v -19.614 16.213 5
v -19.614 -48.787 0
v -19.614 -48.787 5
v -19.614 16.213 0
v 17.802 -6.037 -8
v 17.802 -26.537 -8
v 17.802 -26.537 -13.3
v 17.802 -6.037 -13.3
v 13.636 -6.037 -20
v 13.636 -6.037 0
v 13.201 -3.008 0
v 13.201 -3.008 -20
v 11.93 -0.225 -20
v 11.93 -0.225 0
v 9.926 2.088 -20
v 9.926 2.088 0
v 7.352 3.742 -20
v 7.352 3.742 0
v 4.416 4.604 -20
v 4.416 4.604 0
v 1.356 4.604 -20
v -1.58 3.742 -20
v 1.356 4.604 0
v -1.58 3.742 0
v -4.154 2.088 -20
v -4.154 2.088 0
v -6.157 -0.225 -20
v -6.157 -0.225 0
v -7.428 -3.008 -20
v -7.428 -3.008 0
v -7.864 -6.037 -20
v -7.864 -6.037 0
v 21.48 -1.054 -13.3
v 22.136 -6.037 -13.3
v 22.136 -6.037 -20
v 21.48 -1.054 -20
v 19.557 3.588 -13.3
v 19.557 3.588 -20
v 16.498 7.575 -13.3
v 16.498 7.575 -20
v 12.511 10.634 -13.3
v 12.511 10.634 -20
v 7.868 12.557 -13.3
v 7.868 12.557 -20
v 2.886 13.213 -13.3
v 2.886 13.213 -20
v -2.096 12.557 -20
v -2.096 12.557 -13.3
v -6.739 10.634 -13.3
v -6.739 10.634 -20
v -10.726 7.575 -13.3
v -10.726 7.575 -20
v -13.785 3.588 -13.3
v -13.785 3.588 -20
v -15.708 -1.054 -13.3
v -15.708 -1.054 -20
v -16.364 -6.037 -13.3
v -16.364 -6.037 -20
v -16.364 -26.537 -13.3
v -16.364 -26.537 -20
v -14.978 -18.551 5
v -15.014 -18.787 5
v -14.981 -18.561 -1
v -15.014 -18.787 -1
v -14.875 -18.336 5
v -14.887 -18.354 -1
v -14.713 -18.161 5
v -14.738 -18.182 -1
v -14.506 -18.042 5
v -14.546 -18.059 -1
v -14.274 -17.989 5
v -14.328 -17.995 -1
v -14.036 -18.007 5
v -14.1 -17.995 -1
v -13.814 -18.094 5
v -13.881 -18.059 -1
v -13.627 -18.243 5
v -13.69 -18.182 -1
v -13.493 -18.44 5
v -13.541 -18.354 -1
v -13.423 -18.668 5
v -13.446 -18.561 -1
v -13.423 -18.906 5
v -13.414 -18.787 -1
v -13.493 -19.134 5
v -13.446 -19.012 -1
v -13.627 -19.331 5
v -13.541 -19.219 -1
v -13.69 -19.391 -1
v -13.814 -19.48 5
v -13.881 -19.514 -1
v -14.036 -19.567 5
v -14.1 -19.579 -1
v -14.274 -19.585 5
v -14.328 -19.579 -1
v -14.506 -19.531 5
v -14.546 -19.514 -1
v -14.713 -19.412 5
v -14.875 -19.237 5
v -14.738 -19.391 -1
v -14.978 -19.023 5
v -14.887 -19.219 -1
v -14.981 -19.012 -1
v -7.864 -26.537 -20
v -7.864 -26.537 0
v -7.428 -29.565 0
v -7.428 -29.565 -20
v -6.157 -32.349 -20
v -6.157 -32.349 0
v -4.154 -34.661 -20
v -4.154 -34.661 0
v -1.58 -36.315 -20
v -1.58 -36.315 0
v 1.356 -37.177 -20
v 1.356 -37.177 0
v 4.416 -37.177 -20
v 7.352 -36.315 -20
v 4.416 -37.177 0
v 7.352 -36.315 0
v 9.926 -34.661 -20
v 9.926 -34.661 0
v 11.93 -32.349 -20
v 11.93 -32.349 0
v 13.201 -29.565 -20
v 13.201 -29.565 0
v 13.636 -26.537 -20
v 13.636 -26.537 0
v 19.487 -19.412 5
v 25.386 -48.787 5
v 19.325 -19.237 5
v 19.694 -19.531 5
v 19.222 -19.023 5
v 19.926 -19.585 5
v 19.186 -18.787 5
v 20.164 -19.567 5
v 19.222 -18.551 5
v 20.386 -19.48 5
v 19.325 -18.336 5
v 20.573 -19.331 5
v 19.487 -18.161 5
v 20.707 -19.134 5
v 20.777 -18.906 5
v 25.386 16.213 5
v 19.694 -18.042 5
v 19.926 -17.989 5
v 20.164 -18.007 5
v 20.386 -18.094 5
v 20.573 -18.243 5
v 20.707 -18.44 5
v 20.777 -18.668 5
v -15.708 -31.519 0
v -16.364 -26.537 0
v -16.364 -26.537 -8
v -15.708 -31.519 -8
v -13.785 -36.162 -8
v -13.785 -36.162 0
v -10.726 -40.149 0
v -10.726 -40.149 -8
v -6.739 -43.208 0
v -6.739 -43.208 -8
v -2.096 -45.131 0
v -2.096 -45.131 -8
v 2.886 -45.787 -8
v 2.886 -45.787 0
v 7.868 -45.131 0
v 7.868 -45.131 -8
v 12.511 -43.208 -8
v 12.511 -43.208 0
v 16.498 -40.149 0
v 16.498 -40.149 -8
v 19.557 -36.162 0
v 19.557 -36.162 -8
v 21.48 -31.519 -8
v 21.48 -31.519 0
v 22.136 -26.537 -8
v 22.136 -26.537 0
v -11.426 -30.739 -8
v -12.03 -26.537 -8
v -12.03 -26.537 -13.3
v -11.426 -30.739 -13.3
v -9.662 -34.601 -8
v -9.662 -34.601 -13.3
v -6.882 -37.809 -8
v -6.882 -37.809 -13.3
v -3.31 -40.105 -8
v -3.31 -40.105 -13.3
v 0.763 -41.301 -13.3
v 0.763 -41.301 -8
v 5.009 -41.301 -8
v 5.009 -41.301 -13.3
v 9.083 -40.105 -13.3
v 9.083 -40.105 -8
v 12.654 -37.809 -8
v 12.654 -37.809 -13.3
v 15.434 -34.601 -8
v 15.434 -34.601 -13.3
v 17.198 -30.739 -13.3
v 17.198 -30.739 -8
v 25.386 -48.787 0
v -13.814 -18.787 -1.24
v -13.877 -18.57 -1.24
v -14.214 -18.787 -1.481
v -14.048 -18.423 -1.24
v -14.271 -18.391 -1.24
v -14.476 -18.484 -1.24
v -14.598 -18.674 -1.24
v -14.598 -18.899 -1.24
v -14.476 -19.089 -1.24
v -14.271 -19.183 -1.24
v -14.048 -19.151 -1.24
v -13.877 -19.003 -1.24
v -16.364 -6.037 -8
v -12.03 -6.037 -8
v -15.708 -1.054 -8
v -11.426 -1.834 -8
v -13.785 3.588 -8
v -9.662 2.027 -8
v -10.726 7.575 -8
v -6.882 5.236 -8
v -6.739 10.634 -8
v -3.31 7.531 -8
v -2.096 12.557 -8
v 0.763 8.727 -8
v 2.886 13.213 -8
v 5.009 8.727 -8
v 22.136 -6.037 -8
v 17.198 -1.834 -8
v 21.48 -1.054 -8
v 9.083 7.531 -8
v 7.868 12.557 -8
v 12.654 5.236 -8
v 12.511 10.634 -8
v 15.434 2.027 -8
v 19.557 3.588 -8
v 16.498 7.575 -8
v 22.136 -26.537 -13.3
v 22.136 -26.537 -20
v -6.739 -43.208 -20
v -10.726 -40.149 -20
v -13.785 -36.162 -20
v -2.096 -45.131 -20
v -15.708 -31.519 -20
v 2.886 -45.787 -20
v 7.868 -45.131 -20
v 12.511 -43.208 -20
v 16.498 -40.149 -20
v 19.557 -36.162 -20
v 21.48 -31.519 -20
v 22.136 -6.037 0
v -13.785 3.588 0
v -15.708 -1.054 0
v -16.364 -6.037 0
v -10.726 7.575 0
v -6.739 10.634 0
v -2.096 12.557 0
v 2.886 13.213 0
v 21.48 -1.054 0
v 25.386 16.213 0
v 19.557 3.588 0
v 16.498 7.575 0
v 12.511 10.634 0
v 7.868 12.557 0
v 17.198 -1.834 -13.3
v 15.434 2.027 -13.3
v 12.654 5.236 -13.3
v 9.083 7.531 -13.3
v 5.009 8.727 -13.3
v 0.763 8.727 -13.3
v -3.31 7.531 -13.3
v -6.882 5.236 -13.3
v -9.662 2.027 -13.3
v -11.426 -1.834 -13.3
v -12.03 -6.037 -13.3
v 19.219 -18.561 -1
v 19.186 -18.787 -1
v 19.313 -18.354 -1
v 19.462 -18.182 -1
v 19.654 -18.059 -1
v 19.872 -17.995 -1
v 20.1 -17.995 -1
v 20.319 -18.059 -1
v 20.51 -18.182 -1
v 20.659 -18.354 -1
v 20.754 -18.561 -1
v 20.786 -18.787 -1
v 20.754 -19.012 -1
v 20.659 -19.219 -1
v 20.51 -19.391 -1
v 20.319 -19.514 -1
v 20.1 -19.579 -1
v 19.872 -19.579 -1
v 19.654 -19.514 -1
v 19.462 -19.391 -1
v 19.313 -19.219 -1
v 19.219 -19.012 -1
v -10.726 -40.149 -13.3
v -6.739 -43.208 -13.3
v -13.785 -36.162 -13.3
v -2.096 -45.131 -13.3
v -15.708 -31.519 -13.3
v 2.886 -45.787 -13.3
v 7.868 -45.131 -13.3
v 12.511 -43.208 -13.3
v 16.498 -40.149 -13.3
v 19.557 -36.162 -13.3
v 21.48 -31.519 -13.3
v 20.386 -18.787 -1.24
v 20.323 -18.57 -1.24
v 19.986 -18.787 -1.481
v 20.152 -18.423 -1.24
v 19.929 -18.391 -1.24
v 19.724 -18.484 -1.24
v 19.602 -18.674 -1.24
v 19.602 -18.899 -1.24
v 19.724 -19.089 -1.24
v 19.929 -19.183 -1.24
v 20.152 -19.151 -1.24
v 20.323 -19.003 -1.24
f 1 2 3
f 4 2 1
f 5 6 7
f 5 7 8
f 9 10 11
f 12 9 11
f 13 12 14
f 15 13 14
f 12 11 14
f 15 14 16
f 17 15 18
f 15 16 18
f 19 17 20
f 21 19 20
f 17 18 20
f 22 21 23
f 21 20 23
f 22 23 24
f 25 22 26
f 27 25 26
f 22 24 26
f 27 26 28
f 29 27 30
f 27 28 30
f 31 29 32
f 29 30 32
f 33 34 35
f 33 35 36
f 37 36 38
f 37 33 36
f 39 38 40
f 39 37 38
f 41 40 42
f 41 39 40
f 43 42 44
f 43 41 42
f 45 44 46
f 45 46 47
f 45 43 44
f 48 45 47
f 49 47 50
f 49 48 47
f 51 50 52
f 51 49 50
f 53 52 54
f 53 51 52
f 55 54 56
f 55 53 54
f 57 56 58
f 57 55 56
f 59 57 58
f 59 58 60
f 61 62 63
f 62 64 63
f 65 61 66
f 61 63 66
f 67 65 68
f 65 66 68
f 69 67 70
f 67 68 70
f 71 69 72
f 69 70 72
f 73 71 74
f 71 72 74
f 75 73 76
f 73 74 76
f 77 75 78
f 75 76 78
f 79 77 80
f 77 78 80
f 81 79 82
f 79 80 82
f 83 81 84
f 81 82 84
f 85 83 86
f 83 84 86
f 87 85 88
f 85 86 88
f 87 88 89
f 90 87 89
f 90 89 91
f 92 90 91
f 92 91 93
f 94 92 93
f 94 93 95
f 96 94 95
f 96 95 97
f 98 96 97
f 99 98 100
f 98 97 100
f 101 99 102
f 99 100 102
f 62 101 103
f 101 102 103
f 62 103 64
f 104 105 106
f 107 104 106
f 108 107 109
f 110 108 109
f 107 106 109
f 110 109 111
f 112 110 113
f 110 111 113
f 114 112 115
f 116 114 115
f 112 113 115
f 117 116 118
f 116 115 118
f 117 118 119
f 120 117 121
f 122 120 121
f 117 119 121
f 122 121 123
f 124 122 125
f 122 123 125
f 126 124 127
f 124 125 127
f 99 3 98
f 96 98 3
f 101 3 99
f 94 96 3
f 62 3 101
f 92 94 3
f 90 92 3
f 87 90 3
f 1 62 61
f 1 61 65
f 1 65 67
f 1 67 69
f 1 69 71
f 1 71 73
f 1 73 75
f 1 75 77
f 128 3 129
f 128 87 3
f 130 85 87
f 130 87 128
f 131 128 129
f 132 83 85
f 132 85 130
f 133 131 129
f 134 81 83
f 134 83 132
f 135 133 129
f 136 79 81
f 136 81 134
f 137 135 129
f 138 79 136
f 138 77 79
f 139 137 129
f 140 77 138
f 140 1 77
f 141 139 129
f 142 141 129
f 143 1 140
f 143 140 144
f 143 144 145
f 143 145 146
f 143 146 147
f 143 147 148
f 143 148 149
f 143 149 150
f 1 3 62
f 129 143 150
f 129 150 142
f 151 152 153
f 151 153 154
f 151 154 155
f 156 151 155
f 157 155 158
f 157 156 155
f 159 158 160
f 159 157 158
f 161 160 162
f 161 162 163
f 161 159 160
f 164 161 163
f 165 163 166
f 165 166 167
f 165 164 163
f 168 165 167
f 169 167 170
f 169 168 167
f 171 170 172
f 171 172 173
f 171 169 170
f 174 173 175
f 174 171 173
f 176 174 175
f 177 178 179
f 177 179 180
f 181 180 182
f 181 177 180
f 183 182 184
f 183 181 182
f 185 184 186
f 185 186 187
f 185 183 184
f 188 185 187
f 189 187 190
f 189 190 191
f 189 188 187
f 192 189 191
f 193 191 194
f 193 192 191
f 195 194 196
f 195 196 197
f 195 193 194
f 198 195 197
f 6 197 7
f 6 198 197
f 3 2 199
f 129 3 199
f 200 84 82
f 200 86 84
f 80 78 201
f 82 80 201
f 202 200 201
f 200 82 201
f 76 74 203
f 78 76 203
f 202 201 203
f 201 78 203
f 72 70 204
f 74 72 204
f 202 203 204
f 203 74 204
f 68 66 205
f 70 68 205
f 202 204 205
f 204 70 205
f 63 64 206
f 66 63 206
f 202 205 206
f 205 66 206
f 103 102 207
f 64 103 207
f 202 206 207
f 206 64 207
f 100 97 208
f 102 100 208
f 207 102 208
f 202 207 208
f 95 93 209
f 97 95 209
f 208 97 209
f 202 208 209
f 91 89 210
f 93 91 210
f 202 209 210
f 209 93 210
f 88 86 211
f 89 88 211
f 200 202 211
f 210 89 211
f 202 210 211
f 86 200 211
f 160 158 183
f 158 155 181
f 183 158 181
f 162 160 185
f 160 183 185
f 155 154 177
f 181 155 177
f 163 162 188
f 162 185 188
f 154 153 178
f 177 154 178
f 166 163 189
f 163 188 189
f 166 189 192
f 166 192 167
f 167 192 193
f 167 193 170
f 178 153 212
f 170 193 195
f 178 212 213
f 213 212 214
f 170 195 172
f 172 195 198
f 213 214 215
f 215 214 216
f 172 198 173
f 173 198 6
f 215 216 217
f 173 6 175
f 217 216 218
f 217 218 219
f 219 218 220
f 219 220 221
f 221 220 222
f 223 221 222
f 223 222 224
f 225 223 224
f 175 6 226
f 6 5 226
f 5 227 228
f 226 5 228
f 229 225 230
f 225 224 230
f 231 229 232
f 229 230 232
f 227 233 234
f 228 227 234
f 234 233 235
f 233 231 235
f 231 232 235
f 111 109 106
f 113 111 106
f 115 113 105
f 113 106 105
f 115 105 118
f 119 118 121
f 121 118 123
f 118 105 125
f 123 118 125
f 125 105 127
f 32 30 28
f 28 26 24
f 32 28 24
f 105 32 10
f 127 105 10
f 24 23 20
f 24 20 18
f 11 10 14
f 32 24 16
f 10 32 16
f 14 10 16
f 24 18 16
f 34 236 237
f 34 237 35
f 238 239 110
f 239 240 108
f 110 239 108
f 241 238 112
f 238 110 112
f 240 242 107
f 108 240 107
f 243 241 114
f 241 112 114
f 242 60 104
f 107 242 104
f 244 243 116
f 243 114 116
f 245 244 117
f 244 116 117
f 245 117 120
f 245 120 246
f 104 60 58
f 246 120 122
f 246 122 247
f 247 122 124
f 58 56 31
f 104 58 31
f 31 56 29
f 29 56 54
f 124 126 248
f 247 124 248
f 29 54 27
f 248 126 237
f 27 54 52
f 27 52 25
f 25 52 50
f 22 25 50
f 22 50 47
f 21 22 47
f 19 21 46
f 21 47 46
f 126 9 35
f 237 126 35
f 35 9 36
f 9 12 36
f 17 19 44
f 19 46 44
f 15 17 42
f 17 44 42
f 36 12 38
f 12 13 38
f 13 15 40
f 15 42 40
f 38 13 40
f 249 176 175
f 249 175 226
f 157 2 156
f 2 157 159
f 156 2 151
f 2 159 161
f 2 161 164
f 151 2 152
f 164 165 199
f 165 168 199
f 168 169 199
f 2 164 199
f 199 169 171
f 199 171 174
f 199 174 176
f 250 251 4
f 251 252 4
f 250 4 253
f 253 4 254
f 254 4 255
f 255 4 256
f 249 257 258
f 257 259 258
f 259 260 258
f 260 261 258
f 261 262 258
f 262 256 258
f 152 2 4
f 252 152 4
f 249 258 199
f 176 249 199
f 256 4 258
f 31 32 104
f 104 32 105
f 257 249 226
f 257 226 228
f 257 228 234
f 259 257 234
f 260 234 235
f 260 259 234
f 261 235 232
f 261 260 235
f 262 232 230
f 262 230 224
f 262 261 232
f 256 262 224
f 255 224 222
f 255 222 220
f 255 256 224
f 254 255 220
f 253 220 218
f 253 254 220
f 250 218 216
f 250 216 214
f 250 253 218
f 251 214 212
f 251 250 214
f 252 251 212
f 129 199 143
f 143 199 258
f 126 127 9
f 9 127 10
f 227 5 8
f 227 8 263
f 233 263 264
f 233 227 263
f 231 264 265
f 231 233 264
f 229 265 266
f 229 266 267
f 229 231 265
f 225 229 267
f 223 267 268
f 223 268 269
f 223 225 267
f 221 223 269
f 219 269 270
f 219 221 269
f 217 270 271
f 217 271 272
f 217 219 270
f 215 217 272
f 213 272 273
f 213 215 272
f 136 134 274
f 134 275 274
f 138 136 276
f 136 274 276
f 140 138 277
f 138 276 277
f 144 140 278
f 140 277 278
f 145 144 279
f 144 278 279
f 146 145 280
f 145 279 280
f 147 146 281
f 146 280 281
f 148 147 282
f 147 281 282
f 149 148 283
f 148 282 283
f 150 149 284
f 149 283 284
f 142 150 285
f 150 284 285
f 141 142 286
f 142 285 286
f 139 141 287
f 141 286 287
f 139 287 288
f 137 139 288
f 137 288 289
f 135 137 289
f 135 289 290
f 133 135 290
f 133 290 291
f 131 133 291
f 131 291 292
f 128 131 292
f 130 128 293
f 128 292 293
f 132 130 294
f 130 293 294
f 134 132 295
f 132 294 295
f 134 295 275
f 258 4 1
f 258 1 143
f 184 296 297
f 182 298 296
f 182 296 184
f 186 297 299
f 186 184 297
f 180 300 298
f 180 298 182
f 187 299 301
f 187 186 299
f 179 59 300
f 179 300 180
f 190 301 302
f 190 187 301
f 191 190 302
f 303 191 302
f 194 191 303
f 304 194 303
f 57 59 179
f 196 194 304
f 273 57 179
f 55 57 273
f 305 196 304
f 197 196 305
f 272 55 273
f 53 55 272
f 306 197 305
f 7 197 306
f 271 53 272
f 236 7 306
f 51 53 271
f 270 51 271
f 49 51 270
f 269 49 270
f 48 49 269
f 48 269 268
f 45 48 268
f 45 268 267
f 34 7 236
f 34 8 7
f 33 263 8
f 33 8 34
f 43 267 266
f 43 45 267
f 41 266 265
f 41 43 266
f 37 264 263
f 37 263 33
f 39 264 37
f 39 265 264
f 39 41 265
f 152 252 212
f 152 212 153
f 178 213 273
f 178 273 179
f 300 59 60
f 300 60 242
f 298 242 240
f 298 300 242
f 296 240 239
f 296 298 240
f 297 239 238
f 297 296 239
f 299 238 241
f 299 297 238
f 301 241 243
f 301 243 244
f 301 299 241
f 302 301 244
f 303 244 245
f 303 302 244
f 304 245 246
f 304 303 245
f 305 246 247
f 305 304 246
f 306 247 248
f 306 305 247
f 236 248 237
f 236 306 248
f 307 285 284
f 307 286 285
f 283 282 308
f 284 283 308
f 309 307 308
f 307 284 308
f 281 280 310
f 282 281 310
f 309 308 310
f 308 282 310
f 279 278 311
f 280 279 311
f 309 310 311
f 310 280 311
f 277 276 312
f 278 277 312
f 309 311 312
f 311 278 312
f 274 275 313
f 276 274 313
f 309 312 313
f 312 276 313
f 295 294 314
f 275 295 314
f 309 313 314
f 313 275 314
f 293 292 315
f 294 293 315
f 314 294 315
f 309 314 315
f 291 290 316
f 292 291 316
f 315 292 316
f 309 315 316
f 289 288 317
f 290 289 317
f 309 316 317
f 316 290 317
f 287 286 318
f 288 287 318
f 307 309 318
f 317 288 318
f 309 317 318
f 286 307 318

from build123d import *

# Parameters (mm, degrees)
SKETCH1_W                 = 45
SKETCH1_H                 = 65
BOSS_EXTRUDE1_DEPTH       = 5
BOSS_EXTRUDE2_DEPTH       = 20
BOSS_EXTRUDE3_DEPTH       = 5.3
M2X0_4_TAPPED_HOLE1_D     = 1.6
M2X0_4_TAPPED_HOLE1_DEPTH = 6
M2X0_4_TAPPED_HOLE1_TIP   = 0.480688495


with BuildPart() as part:
    # Sketch1 → Boss-Extrude1 (new body)
    with BuildSketch(Plane.XY):
        with Locations((2.886207951, -16.286739239)):
            Rectangle(SKETCH1_W, SKETCH1_H)
    extrude(amount=BOSS_EXTRUDE1_DEPTH)

    # Sketch4 → Boss-Extrude2 (add)
    with BuildSketch(Plane(origin=(0, 0, 0), x_dir=(-1, 0, 0), z_dir=(0, 0, -1))):
        with BuildLine():
            Line((16.363792049, -6.036739239), (16.363792049, -26.536739239))
            ThreePointArc((16.363792049, -26.536739239), (-2.886207951, -45.786739239), (-22.136207951, -26.536739239))
            Line((-22.136207951, -26.536739239), (-22.136207951, -6.036739239))
            ThreePointArc((-22.136207951, -6.036739239), (-2.886207951, 13.213260761), (16.363792049, -6.036739239))
        make_face()
        with BuildLine():
            Line((7.863792049, -6.036739239), (7.863792049, -26.536739239))
            ThreePointArc((7.863792049, -26.536739239), (-2.886207951, -37.286739239), (-13.636207951, -26.536739239))
            Line((-13.636207951, -26.536739239), (-13.636207951, -6.036739239))
            ThreePointArc((-13.636207951, -6.036739239), (-2.886207951, 4.713260761), (7.863792049, -6.036739239))
        make_face(mode=Mode.SUBTRACT)
    extrude(amount=BOSS_EXTRUDE2_DEPTH)


with BuildPart() as body_2:
    # Sketch6 → Boss-Extrude3 (new body)
    with BuildSketch(Plane(origin=(0, 0, 0), x_dir=(-1, 0, 0), z_dir=(0, 0, -1))):
        with BuildLine():
            Line((16.363792049, -6.036739239), (16.363792049, -26.536739239))
            ThreePointArc((16.363792049, -26.536739239), (-2.886207951, -45.786739239), (-22.136207951, -26.536739239))
            Line((-22.136207951, -26.536739239), (-22.136207951, -6.036739239))
            ThreePointArc((-22.136207951, -6.036739239), (-2.886207951, 13.213260761), (16.363792049, -6.036739239))
        make_face()
        with BuildLine():
            Line((12.029792049, -6.036739239), (12.029792049, -26.536739239))
            ThreePointArc((12.029792049, -26.536739239), (-2.886207951, -41.452739239), (-17.802207951, -26.536739239))
            Line((-17.802207951, -26.536739239), (-17.802207951, -6.036739239))
            ThreePointArc((-17.802207951, -6.036739239), (-2.886207951, 8.879260761), (12.029792049, -6.036739239))
        make_face(mode=Mode.SUBTRACT)
    extrude(amount=BOSS_EXTRUDE3_DEPTH)


with BuildPart() as body_2_1:
    # Body-Move/Copy1: read off the stored shape, not the designer's step
    # Body-Move/Copy1: moved
    add(body_2.part.moved(Location((0, 0, -8))))


with BuildPart() as part_1:
    add(part.part)

    # Combine1: cut body 2
    add(body_2_1.part, mode=Mode.SUBTRACT)

    # M2x0.4 Tapped Hole1
    with Locations(Plane.XY.offset(5)):
        with Locations((-14.213792049, -18.786739239), (19.986207951, -18.786739239)):
            Hole(M2X0_4_TAPPED_HOLE1_D / 2, depth=M2X0_4_TAPPED_HOLE1_DEPTH)
            with Locations((0, 0, -(M2X0_4_TAPPED_HOLE1_DEPTH + M2X0_4_TAPPED_HOLE1_TIP / 2))):  # 118° drill point
                Cone(0, M2X0_4_TAPPED_HOLE1_D / 2, M2X0_4_TAPPED_HOLE1_TIP, mode=Mode.SUBTRACT)


solid = part_1.part
